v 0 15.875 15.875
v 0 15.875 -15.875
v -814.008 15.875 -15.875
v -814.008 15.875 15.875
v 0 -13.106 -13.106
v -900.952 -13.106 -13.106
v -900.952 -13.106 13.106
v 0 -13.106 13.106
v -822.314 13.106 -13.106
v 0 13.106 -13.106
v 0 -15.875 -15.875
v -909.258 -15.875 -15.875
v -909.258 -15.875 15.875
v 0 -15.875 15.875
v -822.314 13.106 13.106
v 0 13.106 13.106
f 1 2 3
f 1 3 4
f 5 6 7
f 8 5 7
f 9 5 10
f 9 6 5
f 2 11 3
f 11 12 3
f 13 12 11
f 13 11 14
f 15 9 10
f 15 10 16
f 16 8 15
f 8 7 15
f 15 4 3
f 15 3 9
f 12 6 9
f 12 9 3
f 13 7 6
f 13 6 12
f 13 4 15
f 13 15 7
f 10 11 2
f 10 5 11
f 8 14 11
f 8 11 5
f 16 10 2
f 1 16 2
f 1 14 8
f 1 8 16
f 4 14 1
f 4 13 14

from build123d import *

# Parameters (mm, degrees)
SKETCH_W     = 31.75
SKETCH_H     = 31.75
SKETCH_W_2   = 26.2128
SKETCH_H_2   = 26.2128
PAD_DEPTH    = 909.258
POCKET_DEPTH = 31.75


with BuildPart() as part:
    # Sketch → Pad (new body)
    with BuildSketch(Plane.YZ):
        Rectangle(SKETCH_W, SKETCH_H)
        Rectangle(SKETCH_W_2, SKETCH_H_2, mode=Mode.SUBTRACT)
    extrude(amount=-PAD_DEPTH)

    # Sketch001 → Pocket (cut)
    with BuildSketch(Plane(origin=(0, 0, 15.875), x_dir=(0, -1, 0), z_dir=(0, 0, 1))):
        Polygon((15.875, -909.258), (-15.875, -909.258), (-15.875, -814.007729), align=None)
    extrude(amount=-POCKET_DEPTH, mode=Mode.SUBTRACT)


solid = part.part
